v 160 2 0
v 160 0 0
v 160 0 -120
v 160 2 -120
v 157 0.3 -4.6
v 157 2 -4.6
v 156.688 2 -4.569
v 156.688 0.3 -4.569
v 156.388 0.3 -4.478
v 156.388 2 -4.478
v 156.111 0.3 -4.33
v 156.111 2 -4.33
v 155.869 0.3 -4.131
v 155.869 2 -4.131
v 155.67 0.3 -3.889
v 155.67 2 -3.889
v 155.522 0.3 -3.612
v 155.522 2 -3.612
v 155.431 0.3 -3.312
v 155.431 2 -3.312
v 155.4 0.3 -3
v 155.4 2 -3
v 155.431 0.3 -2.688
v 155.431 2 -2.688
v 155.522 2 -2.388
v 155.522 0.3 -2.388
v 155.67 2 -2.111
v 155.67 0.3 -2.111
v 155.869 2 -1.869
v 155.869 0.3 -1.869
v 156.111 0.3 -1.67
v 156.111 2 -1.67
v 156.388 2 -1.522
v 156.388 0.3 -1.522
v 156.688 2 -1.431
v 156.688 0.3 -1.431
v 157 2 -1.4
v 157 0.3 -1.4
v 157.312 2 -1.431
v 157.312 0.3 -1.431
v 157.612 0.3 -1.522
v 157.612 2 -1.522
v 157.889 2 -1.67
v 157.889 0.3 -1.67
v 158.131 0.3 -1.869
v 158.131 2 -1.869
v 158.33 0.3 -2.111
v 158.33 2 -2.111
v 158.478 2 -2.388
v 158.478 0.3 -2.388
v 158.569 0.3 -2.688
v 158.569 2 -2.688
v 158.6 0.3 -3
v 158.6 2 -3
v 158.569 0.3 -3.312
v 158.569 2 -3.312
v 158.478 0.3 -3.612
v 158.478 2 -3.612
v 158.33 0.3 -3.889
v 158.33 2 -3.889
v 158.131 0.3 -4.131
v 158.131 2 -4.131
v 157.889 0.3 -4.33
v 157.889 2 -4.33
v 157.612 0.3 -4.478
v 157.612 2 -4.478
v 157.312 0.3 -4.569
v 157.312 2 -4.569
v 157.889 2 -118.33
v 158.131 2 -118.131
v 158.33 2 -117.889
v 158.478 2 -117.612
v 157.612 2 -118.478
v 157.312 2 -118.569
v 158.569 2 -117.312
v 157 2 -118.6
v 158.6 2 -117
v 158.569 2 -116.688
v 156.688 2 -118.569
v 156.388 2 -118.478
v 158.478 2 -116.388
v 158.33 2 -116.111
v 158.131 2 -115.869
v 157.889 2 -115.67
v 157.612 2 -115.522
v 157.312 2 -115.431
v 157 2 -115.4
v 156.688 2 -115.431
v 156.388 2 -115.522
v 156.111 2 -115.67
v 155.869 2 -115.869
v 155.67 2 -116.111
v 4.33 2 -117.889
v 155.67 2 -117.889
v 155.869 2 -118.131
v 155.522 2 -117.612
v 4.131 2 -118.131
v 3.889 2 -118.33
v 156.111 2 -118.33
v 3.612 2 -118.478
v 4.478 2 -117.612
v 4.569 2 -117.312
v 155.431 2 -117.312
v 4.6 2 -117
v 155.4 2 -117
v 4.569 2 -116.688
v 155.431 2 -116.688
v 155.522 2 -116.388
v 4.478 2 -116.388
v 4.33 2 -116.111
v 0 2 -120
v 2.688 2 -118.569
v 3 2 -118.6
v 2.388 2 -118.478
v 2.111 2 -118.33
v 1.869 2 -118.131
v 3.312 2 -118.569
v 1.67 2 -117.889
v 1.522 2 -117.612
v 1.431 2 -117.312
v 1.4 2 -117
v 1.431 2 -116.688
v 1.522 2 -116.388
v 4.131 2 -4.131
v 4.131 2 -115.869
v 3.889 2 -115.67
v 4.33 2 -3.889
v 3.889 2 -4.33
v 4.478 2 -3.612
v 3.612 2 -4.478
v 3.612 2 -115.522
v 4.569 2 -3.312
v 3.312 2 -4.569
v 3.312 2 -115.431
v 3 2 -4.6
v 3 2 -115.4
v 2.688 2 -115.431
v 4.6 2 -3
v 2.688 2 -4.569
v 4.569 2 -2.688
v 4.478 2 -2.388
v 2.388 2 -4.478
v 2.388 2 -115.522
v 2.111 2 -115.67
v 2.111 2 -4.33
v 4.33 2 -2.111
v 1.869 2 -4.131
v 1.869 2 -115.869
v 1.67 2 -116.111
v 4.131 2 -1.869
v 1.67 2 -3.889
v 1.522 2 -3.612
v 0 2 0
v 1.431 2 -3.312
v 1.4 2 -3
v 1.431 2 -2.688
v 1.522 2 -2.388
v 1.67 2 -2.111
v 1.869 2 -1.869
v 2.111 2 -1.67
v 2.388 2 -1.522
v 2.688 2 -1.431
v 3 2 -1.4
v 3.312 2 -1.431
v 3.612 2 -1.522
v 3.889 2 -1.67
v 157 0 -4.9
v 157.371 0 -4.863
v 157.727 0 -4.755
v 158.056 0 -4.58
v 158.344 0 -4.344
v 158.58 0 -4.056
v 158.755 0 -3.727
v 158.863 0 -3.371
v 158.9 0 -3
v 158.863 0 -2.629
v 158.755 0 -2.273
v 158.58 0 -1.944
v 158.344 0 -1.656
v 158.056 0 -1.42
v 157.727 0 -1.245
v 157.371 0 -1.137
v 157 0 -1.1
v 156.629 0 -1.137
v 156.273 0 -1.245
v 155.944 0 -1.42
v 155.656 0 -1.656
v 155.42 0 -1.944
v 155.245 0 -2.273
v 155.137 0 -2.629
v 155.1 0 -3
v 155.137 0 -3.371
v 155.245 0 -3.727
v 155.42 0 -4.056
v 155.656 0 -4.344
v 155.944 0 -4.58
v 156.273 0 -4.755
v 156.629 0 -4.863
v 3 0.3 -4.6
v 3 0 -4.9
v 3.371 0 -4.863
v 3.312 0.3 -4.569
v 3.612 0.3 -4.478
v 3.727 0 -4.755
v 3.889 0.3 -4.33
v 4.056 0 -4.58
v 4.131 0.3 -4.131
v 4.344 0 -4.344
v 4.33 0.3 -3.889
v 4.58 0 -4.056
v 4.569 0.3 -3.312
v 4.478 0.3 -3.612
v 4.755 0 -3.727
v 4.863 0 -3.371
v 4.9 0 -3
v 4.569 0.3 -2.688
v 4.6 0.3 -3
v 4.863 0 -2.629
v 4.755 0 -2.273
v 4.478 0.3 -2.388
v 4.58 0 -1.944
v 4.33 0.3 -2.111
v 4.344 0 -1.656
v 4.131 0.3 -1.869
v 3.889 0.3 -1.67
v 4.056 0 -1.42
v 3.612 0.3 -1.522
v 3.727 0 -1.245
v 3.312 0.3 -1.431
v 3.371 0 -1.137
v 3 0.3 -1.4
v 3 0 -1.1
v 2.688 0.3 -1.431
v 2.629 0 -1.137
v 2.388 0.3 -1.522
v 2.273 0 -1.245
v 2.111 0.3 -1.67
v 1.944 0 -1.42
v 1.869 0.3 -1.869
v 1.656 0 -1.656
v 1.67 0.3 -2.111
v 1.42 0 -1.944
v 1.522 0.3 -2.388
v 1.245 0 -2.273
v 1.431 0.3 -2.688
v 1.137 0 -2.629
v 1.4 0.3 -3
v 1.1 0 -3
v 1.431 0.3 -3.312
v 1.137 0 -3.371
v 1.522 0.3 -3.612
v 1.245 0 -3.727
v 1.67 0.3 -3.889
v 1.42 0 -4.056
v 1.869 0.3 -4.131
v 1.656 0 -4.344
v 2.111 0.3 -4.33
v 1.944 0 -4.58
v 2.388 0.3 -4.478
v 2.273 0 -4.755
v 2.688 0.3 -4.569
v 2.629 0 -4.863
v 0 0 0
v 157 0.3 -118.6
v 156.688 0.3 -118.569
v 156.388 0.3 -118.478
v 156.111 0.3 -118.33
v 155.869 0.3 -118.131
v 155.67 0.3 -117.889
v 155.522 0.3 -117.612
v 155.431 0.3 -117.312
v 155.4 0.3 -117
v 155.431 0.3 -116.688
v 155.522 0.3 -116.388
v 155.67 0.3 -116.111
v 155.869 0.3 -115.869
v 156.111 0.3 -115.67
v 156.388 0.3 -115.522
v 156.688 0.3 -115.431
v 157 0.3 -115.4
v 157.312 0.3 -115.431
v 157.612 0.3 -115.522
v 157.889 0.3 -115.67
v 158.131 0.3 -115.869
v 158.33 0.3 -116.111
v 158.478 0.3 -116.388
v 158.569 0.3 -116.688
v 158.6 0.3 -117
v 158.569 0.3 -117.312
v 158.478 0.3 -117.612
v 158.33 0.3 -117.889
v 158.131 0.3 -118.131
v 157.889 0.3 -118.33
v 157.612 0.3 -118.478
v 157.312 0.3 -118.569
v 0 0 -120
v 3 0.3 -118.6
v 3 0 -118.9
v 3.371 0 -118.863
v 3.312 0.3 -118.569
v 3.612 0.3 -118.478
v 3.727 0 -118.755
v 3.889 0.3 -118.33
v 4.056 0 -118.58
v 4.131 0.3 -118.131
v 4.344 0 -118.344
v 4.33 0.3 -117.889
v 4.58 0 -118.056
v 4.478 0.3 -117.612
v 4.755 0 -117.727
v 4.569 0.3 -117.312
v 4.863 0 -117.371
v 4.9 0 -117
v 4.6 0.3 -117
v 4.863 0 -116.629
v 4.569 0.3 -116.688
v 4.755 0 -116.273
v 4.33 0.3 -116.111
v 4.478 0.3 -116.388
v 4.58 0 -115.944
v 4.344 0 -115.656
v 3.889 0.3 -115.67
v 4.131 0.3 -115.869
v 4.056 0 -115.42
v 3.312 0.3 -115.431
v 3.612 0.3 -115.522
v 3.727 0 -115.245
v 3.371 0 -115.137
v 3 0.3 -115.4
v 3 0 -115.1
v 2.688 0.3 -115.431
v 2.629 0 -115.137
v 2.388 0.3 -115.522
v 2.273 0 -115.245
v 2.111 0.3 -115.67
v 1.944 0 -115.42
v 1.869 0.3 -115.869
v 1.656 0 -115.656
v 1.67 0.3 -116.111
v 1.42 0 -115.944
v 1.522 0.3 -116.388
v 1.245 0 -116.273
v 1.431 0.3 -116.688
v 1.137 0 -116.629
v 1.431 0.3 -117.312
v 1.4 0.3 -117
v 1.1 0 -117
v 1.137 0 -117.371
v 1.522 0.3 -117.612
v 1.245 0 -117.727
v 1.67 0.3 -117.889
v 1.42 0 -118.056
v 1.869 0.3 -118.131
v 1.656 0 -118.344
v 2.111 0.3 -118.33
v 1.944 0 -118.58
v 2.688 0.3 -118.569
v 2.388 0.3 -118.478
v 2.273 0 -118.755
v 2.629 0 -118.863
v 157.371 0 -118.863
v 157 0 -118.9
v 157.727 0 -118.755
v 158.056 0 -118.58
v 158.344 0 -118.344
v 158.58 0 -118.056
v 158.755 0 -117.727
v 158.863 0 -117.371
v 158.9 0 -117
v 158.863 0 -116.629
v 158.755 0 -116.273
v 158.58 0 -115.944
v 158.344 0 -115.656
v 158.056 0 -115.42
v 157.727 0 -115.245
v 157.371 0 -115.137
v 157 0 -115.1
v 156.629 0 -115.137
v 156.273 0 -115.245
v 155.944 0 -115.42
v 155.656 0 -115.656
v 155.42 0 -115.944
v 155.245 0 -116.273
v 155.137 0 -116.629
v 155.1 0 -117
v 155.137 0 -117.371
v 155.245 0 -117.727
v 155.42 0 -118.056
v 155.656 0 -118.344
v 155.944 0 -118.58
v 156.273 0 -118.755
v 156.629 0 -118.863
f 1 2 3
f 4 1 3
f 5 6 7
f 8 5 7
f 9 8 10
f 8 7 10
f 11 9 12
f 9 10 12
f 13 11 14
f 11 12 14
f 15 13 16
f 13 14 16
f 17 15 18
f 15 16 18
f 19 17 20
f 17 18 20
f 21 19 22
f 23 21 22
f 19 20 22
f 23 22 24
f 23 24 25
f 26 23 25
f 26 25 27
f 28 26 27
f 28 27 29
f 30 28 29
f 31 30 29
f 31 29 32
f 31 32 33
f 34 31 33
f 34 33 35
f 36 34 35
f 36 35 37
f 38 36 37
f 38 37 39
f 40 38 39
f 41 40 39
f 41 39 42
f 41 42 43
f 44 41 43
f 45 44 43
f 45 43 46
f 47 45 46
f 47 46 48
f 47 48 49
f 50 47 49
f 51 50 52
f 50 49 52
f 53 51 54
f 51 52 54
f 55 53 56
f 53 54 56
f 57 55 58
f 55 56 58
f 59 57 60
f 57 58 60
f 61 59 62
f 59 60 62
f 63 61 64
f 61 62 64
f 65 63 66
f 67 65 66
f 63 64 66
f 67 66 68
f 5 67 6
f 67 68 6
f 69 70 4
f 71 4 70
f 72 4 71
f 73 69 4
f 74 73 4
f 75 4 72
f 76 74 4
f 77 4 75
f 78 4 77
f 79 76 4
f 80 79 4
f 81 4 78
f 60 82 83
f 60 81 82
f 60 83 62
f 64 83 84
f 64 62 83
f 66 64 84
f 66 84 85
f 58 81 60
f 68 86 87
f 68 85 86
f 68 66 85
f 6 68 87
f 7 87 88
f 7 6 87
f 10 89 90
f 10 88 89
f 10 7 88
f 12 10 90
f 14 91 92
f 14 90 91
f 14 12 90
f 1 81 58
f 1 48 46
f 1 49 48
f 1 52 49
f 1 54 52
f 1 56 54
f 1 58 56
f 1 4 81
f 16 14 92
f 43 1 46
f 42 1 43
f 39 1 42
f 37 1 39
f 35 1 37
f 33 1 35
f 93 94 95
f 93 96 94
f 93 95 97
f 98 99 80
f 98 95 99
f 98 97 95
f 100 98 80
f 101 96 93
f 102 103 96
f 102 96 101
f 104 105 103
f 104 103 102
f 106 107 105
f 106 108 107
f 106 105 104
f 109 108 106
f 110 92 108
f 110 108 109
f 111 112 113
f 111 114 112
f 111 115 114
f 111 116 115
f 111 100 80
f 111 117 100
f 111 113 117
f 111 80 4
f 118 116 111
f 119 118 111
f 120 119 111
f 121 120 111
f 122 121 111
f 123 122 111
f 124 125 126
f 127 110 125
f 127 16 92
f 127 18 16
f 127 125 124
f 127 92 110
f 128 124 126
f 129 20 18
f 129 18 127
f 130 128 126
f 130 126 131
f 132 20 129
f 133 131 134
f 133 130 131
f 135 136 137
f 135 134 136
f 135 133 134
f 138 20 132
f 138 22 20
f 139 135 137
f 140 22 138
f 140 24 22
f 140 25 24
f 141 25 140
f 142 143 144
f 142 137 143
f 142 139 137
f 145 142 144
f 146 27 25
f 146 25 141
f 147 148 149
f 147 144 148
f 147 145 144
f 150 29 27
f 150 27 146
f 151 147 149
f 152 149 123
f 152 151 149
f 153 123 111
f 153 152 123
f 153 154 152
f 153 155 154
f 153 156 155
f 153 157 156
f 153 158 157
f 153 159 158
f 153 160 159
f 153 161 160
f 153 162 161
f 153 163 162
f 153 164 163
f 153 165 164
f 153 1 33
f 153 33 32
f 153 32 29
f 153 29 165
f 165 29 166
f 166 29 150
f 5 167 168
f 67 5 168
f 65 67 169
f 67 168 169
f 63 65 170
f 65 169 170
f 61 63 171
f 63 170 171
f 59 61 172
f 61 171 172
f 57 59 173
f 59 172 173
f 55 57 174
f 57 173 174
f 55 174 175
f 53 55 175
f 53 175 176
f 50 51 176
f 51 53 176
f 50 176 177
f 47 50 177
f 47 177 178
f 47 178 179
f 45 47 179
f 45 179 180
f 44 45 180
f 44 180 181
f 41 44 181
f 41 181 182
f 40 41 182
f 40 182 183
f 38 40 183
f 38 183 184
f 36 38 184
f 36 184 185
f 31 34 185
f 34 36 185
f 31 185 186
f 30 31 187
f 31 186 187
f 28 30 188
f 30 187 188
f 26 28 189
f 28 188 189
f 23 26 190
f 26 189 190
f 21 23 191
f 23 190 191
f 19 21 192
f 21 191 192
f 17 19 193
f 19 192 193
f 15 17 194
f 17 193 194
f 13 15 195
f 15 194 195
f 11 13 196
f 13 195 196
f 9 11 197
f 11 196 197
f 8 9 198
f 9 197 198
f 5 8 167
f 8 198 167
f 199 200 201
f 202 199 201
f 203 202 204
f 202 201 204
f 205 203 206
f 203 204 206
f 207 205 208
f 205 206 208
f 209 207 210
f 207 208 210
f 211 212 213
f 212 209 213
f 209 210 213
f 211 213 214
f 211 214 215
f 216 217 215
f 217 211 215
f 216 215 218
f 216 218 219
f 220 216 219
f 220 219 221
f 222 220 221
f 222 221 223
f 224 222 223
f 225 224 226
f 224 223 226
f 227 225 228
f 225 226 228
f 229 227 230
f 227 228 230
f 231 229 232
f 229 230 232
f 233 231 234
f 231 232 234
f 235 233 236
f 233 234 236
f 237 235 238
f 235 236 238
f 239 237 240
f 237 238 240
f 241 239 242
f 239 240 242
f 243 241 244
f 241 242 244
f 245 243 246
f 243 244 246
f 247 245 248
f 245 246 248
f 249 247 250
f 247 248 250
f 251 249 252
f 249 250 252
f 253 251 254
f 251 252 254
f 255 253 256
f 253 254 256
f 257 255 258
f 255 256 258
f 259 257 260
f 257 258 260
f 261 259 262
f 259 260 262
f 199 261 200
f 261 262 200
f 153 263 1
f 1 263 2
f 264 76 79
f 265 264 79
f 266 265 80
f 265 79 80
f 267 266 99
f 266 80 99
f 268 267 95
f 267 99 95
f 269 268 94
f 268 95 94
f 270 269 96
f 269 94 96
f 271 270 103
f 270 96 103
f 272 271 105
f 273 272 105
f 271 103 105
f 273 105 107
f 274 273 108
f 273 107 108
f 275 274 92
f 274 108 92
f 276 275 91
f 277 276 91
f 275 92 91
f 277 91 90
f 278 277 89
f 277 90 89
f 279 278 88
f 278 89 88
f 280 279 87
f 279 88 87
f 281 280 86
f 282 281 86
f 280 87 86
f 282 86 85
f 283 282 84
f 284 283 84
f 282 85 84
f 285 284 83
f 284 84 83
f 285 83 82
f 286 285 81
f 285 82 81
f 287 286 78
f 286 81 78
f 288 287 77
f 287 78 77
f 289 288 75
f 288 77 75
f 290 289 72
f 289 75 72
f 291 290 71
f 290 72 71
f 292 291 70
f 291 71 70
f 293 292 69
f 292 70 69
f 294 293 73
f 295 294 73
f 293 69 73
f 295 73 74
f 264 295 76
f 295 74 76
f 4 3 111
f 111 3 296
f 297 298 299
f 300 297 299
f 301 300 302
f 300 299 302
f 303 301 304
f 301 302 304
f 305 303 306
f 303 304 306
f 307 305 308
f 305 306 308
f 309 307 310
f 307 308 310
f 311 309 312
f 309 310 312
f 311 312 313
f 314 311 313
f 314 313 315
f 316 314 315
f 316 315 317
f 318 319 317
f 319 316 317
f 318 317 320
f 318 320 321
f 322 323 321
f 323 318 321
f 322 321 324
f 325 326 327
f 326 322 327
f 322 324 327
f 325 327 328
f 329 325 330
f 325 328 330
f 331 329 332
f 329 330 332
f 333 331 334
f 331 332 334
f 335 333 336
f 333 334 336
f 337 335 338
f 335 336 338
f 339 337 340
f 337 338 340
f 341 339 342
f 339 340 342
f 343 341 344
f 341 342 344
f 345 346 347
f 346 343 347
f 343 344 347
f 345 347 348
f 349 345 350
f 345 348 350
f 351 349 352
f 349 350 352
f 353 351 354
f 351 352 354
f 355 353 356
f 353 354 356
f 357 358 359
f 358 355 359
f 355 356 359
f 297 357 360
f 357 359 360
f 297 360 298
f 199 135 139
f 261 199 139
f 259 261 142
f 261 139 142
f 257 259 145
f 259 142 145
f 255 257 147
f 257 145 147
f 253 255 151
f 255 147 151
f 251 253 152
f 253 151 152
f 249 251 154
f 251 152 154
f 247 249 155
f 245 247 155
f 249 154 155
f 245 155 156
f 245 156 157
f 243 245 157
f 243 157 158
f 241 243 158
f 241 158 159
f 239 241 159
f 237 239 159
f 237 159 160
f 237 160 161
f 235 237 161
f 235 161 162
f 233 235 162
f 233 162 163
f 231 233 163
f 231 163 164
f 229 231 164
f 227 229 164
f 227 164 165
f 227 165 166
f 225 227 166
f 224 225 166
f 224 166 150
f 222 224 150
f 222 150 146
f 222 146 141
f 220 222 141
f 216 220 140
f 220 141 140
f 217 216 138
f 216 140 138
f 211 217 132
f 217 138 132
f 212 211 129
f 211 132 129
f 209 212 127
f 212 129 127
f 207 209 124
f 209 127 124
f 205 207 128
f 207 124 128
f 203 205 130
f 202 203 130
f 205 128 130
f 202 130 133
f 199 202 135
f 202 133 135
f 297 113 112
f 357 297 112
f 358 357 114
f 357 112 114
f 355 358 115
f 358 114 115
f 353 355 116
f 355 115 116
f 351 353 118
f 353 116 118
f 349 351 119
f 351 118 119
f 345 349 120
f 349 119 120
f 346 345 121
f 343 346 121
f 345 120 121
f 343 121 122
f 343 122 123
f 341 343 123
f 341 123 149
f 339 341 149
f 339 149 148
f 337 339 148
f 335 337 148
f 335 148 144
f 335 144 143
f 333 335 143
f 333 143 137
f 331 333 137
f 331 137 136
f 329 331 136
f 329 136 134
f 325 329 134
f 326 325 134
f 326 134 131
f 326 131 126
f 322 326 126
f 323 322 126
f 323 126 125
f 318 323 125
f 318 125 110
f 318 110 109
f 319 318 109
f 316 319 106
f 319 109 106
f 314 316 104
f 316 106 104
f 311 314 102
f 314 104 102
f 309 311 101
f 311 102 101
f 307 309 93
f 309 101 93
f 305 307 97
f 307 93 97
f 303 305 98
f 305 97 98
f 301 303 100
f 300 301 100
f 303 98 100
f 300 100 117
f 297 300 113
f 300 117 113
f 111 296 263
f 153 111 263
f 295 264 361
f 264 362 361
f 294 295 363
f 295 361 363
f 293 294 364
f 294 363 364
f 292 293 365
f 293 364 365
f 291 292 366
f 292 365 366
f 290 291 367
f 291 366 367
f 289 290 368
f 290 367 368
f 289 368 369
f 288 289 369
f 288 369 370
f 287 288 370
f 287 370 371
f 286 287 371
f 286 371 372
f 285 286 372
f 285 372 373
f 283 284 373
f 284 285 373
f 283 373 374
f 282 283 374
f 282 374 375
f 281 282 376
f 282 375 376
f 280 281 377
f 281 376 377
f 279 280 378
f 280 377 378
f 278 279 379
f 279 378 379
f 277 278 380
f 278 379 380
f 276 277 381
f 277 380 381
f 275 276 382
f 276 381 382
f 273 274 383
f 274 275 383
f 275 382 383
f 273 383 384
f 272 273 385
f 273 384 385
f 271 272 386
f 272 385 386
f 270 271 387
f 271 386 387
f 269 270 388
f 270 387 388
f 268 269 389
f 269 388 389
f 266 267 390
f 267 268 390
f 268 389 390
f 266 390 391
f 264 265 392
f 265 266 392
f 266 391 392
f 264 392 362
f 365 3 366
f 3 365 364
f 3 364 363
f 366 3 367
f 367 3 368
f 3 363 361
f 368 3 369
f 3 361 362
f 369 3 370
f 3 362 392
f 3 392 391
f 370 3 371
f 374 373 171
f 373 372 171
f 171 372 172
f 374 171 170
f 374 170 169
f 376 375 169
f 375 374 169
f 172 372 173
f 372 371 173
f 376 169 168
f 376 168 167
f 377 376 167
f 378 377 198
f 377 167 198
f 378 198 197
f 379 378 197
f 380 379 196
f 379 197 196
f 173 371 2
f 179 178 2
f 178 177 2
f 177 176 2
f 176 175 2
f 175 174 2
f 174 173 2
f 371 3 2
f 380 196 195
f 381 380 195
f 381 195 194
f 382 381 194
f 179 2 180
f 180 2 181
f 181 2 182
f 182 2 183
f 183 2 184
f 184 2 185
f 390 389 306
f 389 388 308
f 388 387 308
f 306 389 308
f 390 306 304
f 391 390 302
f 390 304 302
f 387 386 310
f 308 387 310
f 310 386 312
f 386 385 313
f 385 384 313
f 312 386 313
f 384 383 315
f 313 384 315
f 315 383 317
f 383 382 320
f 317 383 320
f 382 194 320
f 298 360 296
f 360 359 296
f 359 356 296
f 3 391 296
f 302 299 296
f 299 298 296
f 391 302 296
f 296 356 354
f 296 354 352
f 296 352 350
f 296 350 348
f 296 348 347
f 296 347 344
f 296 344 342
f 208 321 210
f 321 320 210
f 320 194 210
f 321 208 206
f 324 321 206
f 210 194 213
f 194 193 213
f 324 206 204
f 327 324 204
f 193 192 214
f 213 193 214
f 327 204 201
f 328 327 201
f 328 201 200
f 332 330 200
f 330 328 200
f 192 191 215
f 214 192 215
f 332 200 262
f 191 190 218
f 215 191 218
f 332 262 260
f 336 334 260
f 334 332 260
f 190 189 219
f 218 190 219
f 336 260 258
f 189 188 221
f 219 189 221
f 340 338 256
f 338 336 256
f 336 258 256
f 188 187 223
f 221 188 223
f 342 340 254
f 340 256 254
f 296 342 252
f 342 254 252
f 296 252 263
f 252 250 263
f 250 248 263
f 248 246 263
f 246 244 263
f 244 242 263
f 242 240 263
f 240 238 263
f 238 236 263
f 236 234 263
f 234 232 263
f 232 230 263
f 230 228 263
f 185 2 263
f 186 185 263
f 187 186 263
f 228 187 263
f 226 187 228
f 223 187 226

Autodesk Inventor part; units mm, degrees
ref_plane "YZ Plane" through (0, 0, 0) normal (1, 0, 0) x (0, 1, 0)
ref_plane "XZ Plane" through (0, 0, 0) normal (0, 1, 0) x (-1, 0, 0)
ref_plane "XY Plane" through (0, 0, 0) normal (0, 0, 1) x (1, 0, 0)
sketch "Sketch1" plane through (0, 0, 0) normal (0, 1, 0) x (-1, 0, 0)
  line L0 (0, 0) -> (-160, 0)
  line L1 (-160, 0) -> (-160, -120)
  line L2 (-160, -120) -> (0, -120)
  line L3 (0, -120) -> (0, 0)
  dimension "d0" = 160
  dimension "d1" = 120
extrude "Extrusion1" add sketch "Sketch1" along normal blind 2
sketch "Sketch2" plane through (0, 0, 0) normal (0, -1, 0) x (1, 0, 0)
  line L0 (157, -3) -> (3, -3) construction
  line L1 (3, -3) -> (3, -117) construction
  line L2 (3, -117) -> (157, -117) construction
  line L3 (157, -117) -> (157, -3) construction
  line L4 (0, 0) -> (160, 0) construction
  line L5 (160, -120) -> (0, -120) construction
  line L6 (160, 0) -> (160, -120) construction
  line L7 (0, -120) -> (0, 0) construction
  circle A0 centre (157, -3) radius 1 construction
  circle A1 centre (157, -117) radius 1 construction
  circle A2 centre (3, -117) radius 1 construction
  circle A3 centre (3, -3) radius 1 construction
  dimension "d4" = 3
  dimension "d5" = 3
  dimension "d6" = 3
  dimension "d7" = 3
  dimension "d8" = 2
  dimension "d9" = 2
  dimension "d10" = 2
  dimension "d11" = 2
hole "Hole1" at (3, 0, -3) at (3, 0, -117) at (157, 0, -117) at (157, 0, -3) direction (0, 1, 0) diameter 3.2 depth 7.2 tip angle 118
chamfer "Chamfer1" distance 0.3 angle 45 4 edges at (157, 0, -115.4) (3, 0, -115.4) (157, 0, -1.4) (3, 0, -1.4)
equation "\"d4\" = d5"
equation "\"d6\" = d5"
equation "\"d7\" = d5"
properties part number "plyta-dolna"
